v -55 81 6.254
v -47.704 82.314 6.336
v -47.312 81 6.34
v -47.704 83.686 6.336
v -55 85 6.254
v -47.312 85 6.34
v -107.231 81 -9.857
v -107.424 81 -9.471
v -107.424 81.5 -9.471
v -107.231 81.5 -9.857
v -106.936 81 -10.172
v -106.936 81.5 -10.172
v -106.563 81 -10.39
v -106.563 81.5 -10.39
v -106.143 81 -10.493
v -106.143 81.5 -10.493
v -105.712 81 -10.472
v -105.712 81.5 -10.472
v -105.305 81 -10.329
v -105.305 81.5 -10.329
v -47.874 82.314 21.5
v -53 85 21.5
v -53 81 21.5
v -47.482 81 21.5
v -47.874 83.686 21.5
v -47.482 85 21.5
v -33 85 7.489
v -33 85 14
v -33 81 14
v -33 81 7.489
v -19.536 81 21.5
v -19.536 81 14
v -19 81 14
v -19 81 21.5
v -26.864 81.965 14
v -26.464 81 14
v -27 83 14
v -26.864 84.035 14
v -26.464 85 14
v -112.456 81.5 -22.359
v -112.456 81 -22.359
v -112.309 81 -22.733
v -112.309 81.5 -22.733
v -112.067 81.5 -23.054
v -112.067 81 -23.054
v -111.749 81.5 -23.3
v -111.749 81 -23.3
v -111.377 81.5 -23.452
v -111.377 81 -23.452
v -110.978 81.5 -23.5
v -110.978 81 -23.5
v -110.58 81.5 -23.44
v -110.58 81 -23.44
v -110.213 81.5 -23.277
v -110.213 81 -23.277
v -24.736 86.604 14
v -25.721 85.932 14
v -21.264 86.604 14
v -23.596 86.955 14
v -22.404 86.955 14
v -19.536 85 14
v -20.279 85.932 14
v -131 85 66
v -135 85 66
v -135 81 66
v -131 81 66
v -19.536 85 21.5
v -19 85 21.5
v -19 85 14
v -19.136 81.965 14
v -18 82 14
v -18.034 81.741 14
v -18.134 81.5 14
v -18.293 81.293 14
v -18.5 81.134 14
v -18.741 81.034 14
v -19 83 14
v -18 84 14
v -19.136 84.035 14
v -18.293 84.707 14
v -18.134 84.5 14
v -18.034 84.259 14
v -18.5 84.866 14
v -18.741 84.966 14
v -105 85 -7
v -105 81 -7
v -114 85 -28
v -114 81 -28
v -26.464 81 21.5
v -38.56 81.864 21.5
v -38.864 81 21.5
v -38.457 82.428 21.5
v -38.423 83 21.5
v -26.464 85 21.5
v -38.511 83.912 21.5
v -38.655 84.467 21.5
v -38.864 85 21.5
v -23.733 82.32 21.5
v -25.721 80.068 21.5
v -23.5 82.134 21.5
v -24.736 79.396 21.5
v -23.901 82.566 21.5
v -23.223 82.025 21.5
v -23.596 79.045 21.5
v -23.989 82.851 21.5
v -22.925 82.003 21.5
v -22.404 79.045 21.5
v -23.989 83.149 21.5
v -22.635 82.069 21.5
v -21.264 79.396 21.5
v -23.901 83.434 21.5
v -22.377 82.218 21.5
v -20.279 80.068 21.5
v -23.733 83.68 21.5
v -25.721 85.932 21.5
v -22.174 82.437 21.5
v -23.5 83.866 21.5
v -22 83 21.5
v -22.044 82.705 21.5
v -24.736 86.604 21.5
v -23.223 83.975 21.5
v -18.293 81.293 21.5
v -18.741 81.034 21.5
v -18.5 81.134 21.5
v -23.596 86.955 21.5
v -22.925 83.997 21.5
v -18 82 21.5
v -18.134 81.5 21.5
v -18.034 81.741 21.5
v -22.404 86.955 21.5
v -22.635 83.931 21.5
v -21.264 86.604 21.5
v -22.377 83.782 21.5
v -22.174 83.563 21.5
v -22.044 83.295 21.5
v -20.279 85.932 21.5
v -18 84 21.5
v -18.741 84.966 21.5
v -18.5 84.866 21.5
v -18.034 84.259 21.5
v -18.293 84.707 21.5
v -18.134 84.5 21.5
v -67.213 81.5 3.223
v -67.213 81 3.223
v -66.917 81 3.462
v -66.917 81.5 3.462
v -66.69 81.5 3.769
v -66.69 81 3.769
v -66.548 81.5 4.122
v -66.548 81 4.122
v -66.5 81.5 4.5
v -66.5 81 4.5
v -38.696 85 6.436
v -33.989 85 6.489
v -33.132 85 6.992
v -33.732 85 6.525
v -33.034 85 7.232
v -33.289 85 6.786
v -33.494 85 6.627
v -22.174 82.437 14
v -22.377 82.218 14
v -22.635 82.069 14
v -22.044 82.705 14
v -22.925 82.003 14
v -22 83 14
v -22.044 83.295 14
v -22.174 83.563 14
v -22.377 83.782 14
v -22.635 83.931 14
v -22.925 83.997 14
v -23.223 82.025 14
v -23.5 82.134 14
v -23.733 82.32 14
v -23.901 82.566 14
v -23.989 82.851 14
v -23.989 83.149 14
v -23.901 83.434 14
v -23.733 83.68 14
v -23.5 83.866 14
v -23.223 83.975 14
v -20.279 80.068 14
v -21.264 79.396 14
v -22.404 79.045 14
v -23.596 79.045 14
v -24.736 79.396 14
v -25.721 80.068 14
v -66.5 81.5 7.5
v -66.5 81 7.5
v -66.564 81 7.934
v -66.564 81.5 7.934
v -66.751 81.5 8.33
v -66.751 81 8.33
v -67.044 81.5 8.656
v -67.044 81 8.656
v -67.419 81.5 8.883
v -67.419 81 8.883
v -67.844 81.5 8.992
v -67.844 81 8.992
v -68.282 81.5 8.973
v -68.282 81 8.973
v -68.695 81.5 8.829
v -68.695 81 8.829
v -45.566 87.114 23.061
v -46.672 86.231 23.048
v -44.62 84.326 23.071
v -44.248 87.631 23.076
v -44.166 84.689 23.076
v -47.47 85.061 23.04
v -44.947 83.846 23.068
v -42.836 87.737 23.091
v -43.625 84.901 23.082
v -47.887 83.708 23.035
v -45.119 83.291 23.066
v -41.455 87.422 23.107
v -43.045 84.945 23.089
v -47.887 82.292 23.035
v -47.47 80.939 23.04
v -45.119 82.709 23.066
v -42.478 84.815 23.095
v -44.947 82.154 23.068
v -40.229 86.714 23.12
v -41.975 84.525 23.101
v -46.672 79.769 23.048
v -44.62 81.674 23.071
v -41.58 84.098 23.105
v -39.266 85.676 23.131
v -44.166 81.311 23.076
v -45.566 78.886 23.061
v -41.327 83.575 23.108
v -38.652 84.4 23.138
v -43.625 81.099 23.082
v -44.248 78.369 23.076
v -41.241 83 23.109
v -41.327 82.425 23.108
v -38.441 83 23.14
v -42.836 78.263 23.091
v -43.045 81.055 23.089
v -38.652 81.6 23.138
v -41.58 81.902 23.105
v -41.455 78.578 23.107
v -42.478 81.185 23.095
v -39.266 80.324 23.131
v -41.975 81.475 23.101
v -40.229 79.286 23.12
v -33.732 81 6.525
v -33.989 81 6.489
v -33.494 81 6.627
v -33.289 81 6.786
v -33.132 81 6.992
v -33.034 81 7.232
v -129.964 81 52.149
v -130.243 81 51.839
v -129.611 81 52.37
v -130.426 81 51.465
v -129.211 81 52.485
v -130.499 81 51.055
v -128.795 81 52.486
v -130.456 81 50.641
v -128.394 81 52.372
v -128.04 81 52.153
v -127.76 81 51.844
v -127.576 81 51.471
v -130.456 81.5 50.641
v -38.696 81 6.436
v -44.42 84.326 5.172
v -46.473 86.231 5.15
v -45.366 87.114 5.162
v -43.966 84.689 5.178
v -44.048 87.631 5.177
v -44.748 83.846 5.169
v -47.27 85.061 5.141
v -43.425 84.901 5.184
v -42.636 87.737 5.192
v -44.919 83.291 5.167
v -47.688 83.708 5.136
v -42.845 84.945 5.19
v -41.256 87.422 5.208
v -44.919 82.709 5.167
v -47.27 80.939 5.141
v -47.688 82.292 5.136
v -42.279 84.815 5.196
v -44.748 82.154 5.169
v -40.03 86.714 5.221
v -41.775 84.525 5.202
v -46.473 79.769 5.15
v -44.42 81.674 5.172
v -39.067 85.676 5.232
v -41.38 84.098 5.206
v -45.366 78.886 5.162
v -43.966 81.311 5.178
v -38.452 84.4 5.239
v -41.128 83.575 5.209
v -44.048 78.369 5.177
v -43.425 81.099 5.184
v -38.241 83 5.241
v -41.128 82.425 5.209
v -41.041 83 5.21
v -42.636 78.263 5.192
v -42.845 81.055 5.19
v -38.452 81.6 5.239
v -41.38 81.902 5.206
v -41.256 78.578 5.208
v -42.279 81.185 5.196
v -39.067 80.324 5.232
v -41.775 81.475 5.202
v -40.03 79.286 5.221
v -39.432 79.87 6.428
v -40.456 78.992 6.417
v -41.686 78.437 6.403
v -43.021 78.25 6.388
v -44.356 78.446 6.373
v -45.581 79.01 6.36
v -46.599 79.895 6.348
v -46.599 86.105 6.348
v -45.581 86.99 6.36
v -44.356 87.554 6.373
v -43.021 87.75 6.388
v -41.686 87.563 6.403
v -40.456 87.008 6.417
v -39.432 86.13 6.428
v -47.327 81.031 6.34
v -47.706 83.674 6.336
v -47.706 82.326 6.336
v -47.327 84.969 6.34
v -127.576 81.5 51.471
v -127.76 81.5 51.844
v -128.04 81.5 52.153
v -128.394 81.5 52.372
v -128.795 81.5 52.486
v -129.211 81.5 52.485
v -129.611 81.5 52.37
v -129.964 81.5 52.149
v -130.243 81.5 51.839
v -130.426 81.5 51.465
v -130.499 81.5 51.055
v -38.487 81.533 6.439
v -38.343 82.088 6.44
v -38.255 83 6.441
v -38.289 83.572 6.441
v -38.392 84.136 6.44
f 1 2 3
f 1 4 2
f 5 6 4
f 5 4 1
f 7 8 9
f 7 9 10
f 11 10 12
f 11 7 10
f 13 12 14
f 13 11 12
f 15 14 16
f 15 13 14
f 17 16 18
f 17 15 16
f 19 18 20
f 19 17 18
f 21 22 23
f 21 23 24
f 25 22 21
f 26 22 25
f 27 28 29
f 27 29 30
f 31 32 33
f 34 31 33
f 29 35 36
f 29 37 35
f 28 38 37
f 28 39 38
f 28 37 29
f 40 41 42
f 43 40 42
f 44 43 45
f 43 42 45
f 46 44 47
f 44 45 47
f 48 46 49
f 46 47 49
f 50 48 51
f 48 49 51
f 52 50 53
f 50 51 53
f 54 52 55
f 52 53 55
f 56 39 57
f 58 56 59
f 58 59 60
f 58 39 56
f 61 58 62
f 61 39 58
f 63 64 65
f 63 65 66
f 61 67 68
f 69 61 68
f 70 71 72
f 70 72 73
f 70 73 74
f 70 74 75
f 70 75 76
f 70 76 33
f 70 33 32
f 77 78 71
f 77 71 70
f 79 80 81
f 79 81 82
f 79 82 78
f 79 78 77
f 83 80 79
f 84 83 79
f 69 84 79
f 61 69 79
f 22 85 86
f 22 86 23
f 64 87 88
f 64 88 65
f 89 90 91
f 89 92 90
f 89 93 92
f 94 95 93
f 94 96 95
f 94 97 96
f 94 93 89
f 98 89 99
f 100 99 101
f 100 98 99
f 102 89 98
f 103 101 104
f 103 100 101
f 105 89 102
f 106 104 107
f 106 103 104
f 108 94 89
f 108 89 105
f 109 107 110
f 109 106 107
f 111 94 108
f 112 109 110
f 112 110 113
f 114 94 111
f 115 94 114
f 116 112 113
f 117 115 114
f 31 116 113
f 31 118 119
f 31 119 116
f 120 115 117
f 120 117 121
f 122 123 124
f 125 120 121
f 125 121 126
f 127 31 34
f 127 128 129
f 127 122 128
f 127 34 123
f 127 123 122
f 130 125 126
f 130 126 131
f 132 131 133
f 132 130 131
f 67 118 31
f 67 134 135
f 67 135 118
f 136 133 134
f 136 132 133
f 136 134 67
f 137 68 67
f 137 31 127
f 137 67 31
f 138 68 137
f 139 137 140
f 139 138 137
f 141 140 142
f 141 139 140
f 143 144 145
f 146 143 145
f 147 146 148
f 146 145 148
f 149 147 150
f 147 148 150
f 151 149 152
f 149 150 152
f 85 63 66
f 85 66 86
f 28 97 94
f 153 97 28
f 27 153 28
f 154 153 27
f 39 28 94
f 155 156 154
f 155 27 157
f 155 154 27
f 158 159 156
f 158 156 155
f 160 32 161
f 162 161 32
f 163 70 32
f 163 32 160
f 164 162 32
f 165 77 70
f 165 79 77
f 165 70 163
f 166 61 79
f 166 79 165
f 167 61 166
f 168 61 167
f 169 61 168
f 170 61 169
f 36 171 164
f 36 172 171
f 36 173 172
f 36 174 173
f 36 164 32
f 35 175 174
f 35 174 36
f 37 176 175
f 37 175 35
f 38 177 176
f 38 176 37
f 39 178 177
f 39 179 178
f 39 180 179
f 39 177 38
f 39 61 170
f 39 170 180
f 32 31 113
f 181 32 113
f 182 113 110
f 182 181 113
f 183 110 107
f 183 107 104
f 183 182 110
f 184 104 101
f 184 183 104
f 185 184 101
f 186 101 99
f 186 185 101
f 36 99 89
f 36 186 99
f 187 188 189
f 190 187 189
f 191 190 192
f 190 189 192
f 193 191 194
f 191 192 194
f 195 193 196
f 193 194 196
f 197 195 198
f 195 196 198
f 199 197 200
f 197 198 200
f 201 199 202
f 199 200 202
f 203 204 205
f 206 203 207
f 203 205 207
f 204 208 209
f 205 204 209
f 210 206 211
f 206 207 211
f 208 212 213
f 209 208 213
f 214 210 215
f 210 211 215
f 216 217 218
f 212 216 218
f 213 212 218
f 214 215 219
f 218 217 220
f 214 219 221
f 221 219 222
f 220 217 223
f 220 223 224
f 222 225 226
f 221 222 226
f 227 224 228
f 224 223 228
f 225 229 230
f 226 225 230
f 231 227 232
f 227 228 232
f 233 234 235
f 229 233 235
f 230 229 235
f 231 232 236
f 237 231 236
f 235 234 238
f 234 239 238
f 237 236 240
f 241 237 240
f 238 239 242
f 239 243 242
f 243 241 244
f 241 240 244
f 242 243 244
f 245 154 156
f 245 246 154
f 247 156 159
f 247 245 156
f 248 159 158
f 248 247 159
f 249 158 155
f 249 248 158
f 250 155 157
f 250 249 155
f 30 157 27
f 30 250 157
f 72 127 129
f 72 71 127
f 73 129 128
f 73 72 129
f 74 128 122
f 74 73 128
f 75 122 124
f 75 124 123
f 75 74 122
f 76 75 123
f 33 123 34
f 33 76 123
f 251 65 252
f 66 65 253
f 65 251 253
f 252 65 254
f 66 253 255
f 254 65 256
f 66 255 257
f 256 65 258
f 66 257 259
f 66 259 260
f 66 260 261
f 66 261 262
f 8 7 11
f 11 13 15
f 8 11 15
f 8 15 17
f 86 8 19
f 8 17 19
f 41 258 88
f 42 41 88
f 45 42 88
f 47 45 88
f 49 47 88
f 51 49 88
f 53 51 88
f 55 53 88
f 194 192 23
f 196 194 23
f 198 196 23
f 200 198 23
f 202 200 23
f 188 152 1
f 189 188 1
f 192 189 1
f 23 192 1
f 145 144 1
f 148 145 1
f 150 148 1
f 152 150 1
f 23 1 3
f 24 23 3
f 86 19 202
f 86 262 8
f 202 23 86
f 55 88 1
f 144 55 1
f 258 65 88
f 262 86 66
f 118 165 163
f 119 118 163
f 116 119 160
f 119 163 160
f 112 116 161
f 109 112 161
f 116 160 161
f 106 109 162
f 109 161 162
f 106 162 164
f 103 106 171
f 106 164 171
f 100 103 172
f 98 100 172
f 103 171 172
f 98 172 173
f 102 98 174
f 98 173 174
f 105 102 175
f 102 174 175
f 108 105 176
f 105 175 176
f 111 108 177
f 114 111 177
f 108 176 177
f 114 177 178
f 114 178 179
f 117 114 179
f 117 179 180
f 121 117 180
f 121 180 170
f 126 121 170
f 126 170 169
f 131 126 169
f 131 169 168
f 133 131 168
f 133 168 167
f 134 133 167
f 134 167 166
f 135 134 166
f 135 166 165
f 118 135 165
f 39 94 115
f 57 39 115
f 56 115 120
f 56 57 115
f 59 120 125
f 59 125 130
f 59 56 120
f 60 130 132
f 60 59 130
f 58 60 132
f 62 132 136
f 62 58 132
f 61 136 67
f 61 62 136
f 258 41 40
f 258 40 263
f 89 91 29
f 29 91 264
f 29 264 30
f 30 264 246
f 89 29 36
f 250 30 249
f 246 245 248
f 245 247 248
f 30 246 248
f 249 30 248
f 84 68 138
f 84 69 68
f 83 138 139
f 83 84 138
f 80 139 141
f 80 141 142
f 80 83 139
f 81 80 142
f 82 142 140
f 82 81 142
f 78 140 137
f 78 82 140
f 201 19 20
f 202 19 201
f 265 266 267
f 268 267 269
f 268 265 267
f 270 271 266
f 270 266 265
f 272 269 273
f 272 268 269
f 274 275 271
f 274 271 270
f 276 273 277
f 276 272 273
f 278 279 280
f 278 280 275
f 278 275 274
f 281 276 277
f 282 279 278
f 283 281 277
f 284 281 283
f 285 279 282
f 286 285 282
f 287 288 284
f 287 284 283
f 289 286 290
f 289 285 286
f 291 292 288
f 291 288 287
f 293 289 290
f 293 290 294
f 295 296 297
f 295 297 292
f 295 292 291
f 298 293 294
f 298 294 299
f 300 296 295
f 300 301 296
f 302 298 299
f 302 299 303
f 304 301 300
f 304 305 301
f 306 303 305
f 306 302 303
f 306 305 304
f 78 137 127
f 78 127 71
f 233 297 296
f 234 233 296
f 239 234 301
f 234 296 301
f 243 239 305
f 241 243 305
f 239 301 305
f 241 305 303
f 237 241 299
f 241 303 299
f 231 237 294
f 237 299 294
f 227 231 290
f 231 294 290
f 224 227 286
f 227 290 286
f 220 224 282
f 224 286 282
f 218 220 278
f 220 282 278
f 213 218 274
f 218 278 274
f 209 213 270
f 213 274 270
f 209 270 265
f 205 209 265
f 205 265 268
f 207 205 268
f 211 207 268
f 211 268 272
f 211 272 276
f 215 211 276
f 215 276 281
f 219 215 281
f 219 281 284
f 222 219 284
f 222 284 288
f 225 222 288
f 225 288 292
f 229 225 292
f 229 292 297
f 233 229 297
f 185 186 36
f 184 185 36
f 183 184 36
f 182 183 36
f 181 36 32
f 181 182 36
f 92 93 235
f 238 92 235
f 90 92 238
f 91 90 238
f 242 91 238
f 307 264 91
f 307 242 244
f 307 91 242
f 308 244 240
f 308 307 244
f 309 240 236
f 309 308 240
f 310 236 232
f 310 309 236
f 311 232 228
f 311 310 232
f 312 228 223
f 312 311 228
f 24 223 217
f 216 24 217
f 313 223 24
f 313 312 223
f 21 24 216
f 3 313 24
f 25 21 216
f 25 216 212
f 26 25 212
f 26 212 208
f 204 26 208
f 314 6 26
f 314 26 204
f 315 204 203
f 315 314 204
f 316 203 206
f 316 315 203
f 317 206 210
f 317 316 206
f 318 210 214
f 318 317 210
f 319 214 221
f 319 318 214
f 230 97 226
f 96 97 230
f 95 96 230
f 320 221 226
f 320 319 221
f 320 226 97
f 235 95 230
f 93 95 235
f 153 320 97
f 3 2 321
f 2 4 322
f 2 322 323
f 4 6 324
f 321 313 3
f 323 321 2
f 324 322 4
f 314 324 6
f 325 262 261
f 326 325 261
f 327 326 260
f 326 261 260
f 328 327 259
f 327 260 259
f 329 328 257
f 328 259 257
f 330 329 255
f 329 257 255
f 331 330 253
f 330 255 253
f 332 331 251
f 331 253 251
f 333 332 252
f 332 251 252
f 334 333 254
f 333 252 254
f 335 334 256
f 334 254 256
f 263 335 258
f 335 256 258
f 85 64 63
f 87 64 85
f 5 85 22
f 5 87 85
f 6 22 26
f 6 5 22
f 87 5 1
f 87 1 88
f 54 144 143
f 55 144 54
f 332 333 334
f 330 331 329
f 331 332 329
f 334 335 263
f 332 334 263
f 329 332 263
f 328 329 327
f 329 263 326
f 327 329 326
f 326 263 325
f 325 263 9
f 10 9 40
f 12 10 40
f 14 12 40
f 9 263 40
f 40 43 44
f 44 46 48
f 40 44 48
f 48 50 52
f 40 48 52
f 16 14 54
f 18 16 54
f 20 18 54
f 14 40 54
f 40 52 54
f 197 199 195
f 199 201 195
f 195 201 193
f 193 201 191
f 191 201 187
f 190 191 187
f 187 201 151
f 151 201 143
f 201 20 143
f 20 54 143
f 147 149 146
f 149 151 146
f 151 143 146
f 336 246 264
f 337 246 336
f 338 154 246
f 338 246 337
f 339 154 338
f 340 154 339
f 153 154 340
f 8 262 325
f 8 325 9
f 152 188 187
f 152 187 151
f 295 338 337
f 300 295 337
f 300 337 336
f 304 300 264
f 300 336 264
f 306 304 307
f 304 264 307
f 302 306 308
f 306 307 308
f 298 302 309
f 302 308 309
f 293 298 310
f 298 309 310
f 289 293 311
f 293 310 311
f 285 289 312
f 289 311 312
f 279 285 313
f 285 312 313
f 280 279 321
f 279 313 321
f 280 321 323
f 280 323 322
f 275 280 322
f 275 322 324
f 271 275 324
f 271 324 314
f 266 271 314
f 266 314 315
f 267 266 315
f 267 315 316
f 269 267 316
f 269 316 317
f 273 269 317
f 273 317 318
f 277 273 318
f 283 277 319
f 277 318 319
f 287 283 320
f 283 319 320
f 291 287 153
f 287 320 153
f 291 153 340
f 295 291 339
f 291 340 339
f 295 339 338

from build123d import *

# Parameters (mm, degrees)
PAD_DEPTH         = 4
POCKET_DEPTH      = 0.5
SKETCH002_R       = 4.75
PAD001_DEPTH      = 1.2
PAD001_DEPTH_BACK = 16.7
SKETCH003_R       = 4
PAD002_DEPTH      = 7.5
SKETCH004_R       = 1.95
POCKET001_DEPTH   = 61.83559
SKETCH005_R       = 1
POCKET002_DEPTH   = 52.001
FILLET_R          = 1
FILLET001_R       = 1
FILLET002_R       = 1


with BuildPart() as part:
    # Sketch → Pad (new body)
    with BuildSketch(Plane(origin=(-43, 85, 6), x_dir=(-1, 0, 0), z_dir=(0, -1, 0))):
        Polygon((-25, -15.5), (-25, -8), (-10, -8), (-10, -0.5), (12, -0.25447), (71, 34), (92, -60), (88, -60), (62, 13), (10, -15.5), align=None)
    extrude(amount=PAD_DEPTH)

    # Sketch001 → Pocket (cut)
    with BuildSketch(Plane(origin=(-43, 81, 6), x_dir=(-1, 0, 0), z_dir=(0, -1, 0))):
        with BuildLine():
            Line((23.5, -1.5), (23.5, 1.5))
            ThreePointArc((24.213026, 2.776977), (23.690332, 2.231279), (23.5, 1.5))
            Line((24.213026, 2.776977), (67.213026, 29.276977))
            ThreePointArc((69.45638, 28.359107), (68.56802, 29.388291), (67.213026, 29.276977))
            Line((69.45638, 28.359107), (87.45638, -44.640893))
            ThreePointArc((84.575842, -45.470927), (86.41533, -46.441354), (87.45638, -44.640893))
            Line((84.575842, -45.470927), (64.424158, 15.470927))
            ThreePointArc((64.424158, 15.470927), (63.562865, 16.390389), (62.304506, 16.329017))
            Line((62.304506, 16.329017), (25.695494, -2.829017))
            ThreePointArc((23.5, -1.5), (24.223225, -2.783207), (25.695494, -2.829017))
        make_face()
    extrude(amount=-POCKET_DEPTH, mode=Mode.SUBTRACT)

    # Sketch002 → Pad001 (new body, two sides)
    with BuildSketch(Plane(origin=(-43.004334, 85, 6.388347), x_dir=(0.999938, 0, 0.01116), z_dir=(0.01116, 0, -0.999938))) as pad001_sk:
        with Locations((0, 2)):
            Circle(SKETCH002_R)
    extrude(amount=PAD001_DEPTH)
    extrude(pad001_sk.sketch, amount=-PAD001_DEPTH_BACK)

    # Sketch003 → Pad002 (new body)
    with BuildSketch(Plane(origin=(-43, 85, 14), x_dir=(1, 0, 0), z_dir=(0, 0, -1))):
        with Locations((20, 2)):
            Circle(SKETCH003_R)
    extrude(amount=-PAD002_DEPTH)

    # Sketch004 → Pocket001 (cut, through all)
    with BuildSketch(Plane(origin=(-42.990942, 85, 5.188422), x_dir=(0.999938, 0, 0.01116), z_dir=(0.01116, 0, -0.999938))):
        with Locations((0, 2)):
            Circle(SKETCH004_R)
    extrude(amount=-POCKET001_DEPTH, mode=Mode.SUBTRACT)

    # Sketch005 → Pocket002 (cut, through all)
    with BuildSketch(Plane(origin=(-43, 85, 14), x_dir=(1, 0, 0), z_dir=(0, 0, -1))):
        with Locations((20, 2)):
            Circle(SKETCH005_R)
    extrude(amount=-POCKET002_DEPTH, mode=Mode.SUBTRACT)

    # Fillet
    fillet_edges = [part.edges().sort_by_distance(p)[0] for p in [
        (-18, 85, 17.75),
    ]]
    fillet(fillet_edges, radius=FILLET_R)

    # Fillet001
    fillet001_edges = [part.edges().sort_by_distance(p)[0] for p in [
        (-18, 81, 17.75),
    ]]
    fillet(fillet001_edges, radius=FILLET001_R)

    # Fillet002
    fillet002_edges = [part.edges().sort_by_distance(p)[0] for p in [
        (-33, 83, 6.5),
    ]]
    fillet(fillet002_edges, radius=FILLET002_R)


solid = part.part
